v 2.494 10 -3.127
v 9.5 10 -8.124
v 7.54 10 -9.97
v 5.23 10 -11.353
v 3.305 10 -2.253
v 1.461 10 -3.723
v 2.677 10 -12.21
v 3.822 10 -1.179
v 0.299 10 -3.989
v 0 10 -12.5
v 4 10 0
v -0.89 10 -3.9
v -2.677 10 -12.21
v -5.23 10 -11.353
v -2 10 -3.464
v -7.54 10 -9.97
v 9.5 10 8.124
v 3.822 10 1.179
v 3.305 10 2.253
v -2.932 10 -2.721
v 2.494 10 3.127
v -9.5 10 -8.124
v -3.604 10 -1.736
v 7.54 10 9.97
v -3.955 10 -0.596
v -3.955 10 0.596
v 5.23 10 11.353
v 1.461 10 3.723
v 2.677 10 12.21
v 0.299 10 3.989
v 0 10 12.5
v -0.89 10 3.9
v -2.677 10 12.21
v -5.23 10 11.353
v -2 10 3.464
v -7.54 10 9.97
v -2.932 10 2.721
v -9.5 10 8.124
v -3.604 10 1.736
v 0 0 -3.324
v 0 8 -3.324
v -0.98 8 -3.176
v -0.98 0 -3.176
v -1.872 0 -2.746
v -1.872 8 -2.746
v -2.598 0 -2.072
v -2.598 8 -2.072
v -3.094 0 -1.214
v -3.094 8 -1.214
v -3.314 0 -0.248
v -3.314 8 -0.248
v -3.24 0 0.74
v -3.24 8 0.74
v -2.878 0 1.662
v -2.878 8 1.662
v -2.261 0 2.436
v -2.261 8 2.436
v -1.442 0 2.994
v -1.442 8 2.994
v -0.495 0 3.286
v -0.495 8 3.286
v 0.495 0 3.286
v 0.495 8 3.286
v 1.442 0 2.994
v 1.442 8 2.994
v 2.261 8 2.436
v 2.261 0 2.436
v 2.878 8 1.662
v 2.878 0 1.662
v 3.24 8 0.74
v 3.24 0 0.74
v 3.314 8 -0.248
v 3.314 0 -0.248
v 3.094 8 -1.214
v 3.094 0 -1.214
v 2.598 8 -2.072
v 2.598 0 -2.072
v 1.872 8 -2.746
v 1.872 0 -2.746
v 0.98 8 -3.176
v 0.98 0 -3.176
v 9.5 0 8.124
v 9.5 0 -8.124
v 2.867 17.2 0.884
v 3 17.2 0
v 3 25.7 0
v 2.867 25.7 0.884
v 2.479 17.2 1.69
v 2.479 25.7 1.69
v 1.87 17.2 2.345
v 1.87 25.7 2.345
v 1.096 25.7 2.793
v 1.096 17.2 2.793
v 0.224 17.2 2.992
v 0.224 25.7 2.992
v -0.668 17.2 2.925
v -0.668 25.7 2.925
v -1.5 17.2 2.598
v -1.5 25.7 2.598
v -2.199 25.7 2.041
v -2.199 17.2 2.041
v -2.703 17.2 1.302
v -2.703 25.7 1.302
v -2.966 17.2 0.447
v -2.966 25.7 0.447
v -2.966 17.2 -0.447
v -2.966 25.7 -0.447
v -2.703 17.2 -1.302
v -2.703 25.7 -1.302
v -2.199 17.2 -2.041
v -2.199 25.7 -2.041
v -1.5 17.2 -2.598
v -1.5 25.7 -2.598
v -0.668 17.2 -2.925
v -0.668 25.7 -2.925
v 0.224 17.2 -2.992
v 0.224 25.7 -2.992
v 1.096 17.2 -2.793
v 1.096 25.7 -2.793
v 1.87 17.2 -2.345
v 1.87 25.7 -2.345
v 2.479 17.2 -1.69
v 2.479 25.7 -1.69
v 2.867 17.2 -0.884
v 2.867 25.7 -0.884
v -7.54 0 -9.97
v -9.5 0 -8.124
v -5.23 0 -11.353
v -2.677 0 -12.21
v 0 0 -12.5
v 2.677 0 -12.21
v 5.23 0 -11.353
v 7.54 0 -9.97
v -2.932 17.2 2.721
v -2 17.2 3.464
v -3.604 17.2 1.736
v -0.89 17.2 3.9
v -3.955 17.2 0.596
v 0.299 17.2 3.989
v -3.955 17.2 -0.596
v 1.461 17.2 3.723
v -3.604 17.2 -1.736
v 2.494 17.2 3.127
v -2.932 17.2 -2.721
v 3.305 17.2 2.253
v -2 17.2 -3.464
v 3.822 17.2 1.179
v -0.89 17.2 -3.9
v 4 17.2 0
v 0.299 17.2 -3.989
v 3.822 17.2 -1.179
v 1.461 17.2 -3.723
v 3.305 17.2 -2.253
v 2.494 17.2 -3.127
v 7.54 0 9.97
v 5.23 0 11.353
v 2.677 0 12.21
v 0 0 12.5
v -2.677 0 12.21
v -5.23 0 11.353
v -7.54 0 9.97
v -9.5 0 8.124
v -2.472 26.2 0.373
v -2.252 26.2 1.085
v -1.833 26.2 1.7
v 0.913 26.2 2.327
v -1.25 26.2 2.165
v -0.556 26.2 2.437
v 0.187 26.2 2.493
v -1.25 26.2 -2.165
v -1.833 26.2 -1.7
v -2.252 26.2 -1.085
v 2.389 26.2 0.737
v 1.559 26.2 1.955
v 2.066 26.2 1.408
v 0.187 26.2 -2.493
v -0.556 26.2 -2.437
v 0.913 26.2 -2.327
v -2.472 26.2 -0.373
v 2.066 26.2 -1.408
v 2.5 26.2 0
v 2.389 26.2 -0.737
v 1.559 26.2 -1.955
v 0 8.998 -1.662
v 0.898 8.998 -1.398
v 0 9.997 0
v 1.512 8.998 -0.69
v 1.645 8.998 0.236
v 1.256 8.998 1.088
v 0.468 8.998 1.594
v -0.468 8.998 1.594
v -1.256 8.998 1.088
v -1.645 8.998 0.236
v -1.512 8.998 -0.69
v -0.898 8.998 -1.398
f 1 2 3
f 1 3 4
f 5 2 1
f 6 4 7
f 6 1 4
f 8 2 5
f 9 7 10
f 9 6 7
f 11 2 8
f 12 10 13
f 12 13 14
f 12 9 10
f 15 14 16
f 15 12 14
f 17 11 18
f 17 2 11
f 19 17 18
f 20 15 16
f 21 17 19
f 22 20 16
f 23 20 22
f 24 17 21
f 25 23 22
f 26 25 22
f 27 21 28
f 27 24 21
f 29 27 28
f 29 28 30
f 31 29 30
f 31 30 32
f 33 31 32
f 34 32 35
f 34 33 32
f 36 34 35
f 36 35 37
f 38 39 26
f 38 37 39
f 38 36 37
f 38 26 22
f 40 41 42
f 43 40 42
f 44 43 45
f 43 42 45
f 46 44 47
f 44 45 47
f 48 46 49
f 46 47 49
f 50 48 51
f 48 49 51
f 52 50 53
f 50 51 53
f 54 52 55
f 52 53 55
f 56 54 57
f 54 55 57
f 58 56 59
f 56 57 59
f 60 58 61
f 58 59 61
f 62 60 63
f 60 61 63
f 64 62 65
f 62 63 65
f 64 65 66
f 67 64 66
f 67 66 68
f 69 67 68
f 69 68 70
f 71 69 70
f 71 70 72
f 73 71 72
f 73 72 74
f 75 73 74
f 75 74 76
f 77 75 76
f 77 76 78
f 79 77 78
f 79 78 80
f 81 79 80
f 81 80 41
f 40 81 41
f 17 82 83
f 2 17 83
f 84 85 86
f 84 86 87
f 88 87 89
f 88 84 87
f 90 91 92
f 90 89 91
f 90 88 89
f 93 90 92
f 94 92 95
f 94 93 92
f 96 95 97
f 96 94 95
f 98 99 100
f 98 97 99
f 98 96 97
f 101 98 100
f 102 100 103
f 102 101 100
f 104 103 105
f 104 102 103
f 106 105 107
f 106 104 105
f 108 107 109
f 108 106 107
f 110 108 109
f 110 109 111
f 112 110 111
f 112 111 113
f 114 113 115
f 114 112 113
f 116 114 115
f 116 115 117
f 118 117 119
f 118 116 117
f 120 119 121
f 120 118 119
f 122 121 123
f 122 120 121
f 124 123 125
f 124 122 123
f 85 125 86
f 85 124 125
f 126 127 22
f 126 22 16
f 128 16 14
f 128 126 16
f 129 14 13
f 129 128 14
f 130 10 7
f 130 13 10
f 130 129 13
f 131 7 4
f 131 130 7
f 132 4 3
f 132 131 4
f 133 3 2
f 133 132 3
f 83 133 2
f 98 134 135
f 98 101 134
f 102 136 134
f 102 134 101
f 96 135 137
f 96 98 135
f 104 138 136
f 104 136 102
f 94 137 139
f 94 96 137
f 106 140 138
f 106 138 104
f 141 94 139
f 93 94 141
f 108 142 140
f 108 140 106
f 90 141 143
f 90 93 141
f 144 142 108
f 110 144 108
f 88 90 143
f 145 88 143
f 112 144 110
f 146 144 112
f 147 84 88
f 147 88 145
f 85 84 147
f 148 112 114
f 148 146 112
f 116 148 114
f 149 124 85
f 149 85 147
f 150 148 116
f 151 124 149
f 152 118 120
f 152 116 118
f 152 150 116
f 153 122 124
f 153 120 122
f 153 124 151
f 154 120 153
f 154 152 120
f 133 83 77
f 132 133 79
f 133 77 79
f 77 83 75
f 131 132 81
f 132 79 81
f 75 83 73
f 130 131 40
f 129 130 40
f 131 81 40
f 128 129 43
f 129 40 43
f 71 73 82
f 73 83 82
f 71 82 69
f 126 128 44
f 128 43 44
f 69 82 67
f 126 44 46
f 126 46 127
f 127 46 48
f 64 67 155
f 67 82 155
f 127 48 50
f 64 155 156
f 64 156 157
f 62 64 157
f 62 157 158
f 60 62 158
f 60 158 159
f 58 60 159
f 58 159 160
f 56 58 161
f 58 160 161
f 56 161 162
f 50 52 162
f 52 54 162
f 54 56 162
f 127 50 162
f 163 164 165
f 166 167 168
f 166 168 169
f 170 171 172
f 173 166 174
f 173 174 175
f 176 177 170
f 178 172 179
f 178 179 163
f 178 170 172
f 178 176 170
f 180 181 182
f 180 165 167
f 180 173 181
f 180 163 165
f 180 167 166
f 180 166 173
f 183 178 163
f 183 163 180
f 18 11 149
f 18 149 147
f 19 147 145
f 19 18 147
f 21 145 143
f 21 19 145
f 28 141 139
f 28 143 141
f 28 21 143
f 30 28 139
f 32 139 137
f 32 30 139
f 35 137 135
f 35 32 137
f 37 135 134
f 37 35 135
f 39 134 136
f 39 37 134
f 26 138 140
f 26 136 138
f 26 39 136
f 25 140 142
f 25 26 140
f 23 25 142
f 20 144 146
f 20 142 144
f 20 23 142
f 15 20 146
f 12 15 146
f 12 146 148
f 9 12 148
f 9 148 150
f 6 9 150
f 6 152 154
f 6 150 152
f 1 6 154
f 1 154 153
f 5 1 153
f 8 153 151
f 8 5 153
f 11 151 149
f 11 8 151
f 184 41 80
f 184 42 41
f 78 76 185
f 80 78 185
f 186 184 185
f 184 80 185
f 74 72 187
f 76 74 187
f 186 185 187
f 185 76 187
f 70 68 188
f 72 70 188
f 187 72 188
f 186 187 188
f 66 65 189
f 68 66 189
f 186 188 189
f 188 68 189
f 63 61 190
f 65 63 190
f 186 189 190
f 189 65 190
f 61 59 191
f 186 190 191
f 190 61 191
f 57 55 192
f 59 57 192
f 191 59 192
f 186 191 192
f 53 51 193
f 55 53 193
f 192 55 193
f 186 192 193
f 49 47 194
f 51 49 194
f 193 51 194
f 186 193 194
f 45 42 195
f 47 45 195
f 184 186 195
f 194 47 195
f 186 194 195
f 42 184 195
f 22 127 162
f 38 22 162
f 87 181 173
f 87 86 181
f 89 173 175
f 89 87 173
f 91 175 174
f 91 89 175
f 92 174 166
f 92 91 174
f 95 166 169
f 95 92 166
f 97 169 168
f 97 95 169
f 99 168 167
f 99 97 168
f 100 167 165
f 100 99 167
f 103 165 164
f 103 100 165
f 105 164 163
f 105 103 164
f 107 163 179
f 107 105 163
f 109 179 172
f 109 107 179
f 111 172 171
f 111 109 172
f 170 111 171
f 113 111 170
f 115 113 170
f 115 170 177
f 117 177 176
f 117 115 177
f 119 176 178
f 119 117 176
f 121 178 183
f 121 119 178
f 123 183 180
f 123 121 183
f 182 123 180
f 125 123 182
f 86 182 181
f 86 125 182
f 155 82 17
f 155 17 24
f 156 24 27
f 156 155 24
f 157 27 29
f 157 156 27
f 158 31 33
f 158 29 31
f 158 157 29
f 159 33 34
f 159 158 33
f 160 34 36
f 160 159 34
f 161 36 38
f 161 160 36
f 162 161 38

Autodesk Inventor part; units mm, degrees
ref_plane "YZ Plane" through (0, 0, 0) normal (1, 0, 0) x (0, 1, 0)
ref_plane "XZ Plane" through (0, 0, 0) normal (0, 1, 0) x (-1, 0, 0)
ref_plane "XY Plane" through (0, 0, 0) normal (0, 0, 1) x (1, 0, 0)
sketch "Sketch1" plane through (0, 0, 0) normal (0, 1, 0) x (-1, 0, 0)
  circle A0 centre (0, 0) radius 12.5
  dimension "d0" = 25
extrude "Extrusion1" add sketch "Sketch1" along normal blind 10
sketch "Sketch2" plane through (0, 10, 0) normal (0, 1, 0) x (1, 0, 0)
  circle A0 centre (0, 0) radius 4
  dimension "d3" = 8
extrude "Extrusion2" add sketch "Sketch2" along normal blind 7.2
sketch "Sketch3" plane through (0, 17.2, 0) normal (0, 1, 0) x (1, 0, 0)
  circle A0 centre (0, 0) radius 4 projected
  circle A1 centre (0, 0) radius 3
  dimension "d6" = 6
extrude "Extrusion3" add sketch "Sketch3" along normal blind 9 contours A1
chamfer "Chamfer1" distance 0.5 angle 45 1 edges at (-3, 26.2, 0)
thread "Thread1" size "M6x1" class "6g" standard "ANSI Metric M Profile" length 16
sketch "Sketch4" plane through (0, 0, 0) normal (0, -1, 0) x (1, 0, 0)
  point P0 (0, 0)
  point P1 (0, 0)
hole "Hole1" at (0, 0, 0) direction (0, 1, 0) diameter 6.647 depth 8 tip angle 118 thread size "M8x1.25" class "6H" standard "ISO Metric profile"
sketch "Sketch5" plane through (0, 0, 0) normal (0, -1, 0) x (1, 0, 0)
  circle A0 centre (0, 0) radius 12.5 projected
  line L0 (9.5, -8.124) -> (-9.5, -8.124)
  line L1 (-9.5, -8.124) -> (-9.5, 8.124)
  line L2 (-9.5, 8.124) -> (9.5, 8.124)
  line L3 (9.5, 8.124) -> (9.5, -8.124)
  line L4 (9.5, -8.124) -> (-9.5, 8.124) construction
  line L5 (-9.5, -8.124) -> (9.5, 8.124) construction
  dimension "d21" = 19
extrude "Extrusion4" cut sketch "Sketch5" against normal through all contours A0 L3 | L1 A0
properties part number "Fixing Stud Pt 2"
